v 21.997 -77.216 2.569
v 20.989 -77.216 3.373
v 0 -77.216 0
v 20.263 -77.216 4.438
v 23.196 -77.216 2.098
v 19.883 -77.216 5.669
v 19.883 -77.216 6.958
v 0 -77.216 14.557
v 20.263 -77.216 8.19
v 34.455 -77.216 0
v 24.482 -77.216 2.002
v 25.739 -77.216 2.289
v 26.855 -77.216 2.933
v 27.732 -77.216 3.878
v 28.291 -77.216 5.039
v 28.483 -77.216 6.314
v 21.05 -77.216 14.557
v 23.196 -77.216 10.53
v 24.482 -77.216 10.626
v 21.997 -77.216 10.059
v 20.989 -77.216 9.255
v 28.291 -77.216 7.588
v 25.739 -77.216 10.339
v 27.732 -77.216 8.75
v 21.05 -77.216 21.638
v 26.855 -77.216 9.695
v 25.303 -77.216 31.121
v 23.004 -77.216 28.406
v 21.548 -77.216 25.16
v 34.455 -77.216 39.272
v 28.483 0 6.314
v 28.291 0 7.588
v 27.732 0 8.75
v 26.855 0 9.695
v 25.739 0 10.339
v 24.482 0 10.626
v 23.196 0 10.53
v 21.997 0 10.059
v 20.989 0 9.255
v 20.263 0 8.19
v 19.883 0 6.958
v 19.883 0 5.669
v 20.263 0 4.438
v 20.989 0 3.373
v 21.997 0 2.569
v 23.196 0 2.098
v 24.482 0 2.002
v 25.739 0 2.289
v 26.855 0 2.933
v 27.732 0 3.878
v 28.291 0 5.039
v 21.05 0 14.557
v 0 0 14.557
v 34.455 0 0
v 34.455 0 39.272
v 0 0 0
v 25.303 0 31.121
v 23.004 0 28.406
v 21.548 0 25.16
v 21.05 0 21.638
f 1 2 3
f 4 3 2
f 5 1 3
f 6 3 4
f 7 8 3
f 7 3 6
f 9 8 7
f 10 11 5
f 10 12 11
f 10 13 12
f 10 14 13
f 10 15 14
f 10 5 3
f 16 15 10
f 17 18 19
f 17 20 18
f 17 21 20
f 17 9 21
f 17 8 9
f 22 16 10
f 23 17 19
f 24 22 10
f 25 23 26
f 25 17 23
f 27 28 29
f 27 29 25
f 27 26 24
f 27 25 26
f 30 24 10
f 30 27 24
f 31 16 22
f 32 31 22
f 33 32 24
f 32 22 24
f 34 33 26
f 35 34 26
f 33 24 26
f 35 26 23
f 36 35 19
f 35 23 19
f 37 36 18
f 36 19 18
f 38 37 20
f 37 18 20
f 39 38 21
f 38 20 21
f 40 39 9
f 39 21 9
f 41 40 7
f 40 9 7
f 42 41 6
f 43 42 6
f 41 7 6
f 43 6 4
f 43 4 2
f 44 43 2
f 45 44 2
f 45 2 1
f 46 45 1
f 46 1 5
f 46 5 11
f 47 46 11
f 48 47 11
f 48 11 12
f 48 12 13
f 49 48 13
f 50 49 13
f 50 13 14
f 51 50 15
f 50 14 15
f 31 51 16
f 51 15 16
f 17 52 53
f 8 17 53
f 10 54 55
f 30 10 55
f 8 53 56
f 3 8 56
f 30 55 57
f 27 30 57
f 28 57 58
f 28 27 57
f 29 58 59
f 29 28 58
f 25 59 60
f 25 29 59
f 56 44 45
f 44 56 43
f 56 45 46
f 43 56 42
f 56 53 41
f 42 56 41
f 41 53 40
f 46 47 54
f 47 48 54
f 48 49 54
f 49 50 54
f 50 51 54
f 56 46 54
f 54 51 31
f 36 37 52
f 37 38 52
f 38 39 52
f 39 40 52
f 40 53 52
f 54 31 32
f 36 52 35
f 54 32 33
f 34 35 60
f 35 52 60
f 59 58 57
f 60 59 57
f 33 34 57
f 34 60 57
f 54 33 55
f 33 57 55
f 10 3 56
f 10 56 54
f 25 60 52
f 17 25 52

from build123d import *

# Parameters (mm, degrees)
F1_DEPTH = 77.216
F2_R     = 12.7
F3_R     = 4.324239
F4_DEPTH = 77.216


with BuildPart() as f1:
    # F0 (on Front) → F1 (new body)
    with BuildSketch(Plane.XZ):
        Polygon((0, 14.556793), (0, 0), (34.454569, 0), (34.454569, 39.271925), (21.049753, 27.33326), (21.049753, 14.556793), align=None)
    extrude(amount=F1_DEPTH)

    # F2
    f2_edges = [f1.edges().sort_by_distance(p)[0] for p in [
        (21.049753, -38.608, 27.33326),
    ]]
    fillet(f2_edges, radius=F2_R)

    # F3 (on face) → F4 (cut, through all)
    with BuildSketch(Plane.XZ.offset(77.216)):
        with Locations((24.158696, 6.31389)):
            Circle(F3_R)
    extrude(amount=-F4_DEPTH, mode=Mode.SUBTRACT)


solid = f1.part
